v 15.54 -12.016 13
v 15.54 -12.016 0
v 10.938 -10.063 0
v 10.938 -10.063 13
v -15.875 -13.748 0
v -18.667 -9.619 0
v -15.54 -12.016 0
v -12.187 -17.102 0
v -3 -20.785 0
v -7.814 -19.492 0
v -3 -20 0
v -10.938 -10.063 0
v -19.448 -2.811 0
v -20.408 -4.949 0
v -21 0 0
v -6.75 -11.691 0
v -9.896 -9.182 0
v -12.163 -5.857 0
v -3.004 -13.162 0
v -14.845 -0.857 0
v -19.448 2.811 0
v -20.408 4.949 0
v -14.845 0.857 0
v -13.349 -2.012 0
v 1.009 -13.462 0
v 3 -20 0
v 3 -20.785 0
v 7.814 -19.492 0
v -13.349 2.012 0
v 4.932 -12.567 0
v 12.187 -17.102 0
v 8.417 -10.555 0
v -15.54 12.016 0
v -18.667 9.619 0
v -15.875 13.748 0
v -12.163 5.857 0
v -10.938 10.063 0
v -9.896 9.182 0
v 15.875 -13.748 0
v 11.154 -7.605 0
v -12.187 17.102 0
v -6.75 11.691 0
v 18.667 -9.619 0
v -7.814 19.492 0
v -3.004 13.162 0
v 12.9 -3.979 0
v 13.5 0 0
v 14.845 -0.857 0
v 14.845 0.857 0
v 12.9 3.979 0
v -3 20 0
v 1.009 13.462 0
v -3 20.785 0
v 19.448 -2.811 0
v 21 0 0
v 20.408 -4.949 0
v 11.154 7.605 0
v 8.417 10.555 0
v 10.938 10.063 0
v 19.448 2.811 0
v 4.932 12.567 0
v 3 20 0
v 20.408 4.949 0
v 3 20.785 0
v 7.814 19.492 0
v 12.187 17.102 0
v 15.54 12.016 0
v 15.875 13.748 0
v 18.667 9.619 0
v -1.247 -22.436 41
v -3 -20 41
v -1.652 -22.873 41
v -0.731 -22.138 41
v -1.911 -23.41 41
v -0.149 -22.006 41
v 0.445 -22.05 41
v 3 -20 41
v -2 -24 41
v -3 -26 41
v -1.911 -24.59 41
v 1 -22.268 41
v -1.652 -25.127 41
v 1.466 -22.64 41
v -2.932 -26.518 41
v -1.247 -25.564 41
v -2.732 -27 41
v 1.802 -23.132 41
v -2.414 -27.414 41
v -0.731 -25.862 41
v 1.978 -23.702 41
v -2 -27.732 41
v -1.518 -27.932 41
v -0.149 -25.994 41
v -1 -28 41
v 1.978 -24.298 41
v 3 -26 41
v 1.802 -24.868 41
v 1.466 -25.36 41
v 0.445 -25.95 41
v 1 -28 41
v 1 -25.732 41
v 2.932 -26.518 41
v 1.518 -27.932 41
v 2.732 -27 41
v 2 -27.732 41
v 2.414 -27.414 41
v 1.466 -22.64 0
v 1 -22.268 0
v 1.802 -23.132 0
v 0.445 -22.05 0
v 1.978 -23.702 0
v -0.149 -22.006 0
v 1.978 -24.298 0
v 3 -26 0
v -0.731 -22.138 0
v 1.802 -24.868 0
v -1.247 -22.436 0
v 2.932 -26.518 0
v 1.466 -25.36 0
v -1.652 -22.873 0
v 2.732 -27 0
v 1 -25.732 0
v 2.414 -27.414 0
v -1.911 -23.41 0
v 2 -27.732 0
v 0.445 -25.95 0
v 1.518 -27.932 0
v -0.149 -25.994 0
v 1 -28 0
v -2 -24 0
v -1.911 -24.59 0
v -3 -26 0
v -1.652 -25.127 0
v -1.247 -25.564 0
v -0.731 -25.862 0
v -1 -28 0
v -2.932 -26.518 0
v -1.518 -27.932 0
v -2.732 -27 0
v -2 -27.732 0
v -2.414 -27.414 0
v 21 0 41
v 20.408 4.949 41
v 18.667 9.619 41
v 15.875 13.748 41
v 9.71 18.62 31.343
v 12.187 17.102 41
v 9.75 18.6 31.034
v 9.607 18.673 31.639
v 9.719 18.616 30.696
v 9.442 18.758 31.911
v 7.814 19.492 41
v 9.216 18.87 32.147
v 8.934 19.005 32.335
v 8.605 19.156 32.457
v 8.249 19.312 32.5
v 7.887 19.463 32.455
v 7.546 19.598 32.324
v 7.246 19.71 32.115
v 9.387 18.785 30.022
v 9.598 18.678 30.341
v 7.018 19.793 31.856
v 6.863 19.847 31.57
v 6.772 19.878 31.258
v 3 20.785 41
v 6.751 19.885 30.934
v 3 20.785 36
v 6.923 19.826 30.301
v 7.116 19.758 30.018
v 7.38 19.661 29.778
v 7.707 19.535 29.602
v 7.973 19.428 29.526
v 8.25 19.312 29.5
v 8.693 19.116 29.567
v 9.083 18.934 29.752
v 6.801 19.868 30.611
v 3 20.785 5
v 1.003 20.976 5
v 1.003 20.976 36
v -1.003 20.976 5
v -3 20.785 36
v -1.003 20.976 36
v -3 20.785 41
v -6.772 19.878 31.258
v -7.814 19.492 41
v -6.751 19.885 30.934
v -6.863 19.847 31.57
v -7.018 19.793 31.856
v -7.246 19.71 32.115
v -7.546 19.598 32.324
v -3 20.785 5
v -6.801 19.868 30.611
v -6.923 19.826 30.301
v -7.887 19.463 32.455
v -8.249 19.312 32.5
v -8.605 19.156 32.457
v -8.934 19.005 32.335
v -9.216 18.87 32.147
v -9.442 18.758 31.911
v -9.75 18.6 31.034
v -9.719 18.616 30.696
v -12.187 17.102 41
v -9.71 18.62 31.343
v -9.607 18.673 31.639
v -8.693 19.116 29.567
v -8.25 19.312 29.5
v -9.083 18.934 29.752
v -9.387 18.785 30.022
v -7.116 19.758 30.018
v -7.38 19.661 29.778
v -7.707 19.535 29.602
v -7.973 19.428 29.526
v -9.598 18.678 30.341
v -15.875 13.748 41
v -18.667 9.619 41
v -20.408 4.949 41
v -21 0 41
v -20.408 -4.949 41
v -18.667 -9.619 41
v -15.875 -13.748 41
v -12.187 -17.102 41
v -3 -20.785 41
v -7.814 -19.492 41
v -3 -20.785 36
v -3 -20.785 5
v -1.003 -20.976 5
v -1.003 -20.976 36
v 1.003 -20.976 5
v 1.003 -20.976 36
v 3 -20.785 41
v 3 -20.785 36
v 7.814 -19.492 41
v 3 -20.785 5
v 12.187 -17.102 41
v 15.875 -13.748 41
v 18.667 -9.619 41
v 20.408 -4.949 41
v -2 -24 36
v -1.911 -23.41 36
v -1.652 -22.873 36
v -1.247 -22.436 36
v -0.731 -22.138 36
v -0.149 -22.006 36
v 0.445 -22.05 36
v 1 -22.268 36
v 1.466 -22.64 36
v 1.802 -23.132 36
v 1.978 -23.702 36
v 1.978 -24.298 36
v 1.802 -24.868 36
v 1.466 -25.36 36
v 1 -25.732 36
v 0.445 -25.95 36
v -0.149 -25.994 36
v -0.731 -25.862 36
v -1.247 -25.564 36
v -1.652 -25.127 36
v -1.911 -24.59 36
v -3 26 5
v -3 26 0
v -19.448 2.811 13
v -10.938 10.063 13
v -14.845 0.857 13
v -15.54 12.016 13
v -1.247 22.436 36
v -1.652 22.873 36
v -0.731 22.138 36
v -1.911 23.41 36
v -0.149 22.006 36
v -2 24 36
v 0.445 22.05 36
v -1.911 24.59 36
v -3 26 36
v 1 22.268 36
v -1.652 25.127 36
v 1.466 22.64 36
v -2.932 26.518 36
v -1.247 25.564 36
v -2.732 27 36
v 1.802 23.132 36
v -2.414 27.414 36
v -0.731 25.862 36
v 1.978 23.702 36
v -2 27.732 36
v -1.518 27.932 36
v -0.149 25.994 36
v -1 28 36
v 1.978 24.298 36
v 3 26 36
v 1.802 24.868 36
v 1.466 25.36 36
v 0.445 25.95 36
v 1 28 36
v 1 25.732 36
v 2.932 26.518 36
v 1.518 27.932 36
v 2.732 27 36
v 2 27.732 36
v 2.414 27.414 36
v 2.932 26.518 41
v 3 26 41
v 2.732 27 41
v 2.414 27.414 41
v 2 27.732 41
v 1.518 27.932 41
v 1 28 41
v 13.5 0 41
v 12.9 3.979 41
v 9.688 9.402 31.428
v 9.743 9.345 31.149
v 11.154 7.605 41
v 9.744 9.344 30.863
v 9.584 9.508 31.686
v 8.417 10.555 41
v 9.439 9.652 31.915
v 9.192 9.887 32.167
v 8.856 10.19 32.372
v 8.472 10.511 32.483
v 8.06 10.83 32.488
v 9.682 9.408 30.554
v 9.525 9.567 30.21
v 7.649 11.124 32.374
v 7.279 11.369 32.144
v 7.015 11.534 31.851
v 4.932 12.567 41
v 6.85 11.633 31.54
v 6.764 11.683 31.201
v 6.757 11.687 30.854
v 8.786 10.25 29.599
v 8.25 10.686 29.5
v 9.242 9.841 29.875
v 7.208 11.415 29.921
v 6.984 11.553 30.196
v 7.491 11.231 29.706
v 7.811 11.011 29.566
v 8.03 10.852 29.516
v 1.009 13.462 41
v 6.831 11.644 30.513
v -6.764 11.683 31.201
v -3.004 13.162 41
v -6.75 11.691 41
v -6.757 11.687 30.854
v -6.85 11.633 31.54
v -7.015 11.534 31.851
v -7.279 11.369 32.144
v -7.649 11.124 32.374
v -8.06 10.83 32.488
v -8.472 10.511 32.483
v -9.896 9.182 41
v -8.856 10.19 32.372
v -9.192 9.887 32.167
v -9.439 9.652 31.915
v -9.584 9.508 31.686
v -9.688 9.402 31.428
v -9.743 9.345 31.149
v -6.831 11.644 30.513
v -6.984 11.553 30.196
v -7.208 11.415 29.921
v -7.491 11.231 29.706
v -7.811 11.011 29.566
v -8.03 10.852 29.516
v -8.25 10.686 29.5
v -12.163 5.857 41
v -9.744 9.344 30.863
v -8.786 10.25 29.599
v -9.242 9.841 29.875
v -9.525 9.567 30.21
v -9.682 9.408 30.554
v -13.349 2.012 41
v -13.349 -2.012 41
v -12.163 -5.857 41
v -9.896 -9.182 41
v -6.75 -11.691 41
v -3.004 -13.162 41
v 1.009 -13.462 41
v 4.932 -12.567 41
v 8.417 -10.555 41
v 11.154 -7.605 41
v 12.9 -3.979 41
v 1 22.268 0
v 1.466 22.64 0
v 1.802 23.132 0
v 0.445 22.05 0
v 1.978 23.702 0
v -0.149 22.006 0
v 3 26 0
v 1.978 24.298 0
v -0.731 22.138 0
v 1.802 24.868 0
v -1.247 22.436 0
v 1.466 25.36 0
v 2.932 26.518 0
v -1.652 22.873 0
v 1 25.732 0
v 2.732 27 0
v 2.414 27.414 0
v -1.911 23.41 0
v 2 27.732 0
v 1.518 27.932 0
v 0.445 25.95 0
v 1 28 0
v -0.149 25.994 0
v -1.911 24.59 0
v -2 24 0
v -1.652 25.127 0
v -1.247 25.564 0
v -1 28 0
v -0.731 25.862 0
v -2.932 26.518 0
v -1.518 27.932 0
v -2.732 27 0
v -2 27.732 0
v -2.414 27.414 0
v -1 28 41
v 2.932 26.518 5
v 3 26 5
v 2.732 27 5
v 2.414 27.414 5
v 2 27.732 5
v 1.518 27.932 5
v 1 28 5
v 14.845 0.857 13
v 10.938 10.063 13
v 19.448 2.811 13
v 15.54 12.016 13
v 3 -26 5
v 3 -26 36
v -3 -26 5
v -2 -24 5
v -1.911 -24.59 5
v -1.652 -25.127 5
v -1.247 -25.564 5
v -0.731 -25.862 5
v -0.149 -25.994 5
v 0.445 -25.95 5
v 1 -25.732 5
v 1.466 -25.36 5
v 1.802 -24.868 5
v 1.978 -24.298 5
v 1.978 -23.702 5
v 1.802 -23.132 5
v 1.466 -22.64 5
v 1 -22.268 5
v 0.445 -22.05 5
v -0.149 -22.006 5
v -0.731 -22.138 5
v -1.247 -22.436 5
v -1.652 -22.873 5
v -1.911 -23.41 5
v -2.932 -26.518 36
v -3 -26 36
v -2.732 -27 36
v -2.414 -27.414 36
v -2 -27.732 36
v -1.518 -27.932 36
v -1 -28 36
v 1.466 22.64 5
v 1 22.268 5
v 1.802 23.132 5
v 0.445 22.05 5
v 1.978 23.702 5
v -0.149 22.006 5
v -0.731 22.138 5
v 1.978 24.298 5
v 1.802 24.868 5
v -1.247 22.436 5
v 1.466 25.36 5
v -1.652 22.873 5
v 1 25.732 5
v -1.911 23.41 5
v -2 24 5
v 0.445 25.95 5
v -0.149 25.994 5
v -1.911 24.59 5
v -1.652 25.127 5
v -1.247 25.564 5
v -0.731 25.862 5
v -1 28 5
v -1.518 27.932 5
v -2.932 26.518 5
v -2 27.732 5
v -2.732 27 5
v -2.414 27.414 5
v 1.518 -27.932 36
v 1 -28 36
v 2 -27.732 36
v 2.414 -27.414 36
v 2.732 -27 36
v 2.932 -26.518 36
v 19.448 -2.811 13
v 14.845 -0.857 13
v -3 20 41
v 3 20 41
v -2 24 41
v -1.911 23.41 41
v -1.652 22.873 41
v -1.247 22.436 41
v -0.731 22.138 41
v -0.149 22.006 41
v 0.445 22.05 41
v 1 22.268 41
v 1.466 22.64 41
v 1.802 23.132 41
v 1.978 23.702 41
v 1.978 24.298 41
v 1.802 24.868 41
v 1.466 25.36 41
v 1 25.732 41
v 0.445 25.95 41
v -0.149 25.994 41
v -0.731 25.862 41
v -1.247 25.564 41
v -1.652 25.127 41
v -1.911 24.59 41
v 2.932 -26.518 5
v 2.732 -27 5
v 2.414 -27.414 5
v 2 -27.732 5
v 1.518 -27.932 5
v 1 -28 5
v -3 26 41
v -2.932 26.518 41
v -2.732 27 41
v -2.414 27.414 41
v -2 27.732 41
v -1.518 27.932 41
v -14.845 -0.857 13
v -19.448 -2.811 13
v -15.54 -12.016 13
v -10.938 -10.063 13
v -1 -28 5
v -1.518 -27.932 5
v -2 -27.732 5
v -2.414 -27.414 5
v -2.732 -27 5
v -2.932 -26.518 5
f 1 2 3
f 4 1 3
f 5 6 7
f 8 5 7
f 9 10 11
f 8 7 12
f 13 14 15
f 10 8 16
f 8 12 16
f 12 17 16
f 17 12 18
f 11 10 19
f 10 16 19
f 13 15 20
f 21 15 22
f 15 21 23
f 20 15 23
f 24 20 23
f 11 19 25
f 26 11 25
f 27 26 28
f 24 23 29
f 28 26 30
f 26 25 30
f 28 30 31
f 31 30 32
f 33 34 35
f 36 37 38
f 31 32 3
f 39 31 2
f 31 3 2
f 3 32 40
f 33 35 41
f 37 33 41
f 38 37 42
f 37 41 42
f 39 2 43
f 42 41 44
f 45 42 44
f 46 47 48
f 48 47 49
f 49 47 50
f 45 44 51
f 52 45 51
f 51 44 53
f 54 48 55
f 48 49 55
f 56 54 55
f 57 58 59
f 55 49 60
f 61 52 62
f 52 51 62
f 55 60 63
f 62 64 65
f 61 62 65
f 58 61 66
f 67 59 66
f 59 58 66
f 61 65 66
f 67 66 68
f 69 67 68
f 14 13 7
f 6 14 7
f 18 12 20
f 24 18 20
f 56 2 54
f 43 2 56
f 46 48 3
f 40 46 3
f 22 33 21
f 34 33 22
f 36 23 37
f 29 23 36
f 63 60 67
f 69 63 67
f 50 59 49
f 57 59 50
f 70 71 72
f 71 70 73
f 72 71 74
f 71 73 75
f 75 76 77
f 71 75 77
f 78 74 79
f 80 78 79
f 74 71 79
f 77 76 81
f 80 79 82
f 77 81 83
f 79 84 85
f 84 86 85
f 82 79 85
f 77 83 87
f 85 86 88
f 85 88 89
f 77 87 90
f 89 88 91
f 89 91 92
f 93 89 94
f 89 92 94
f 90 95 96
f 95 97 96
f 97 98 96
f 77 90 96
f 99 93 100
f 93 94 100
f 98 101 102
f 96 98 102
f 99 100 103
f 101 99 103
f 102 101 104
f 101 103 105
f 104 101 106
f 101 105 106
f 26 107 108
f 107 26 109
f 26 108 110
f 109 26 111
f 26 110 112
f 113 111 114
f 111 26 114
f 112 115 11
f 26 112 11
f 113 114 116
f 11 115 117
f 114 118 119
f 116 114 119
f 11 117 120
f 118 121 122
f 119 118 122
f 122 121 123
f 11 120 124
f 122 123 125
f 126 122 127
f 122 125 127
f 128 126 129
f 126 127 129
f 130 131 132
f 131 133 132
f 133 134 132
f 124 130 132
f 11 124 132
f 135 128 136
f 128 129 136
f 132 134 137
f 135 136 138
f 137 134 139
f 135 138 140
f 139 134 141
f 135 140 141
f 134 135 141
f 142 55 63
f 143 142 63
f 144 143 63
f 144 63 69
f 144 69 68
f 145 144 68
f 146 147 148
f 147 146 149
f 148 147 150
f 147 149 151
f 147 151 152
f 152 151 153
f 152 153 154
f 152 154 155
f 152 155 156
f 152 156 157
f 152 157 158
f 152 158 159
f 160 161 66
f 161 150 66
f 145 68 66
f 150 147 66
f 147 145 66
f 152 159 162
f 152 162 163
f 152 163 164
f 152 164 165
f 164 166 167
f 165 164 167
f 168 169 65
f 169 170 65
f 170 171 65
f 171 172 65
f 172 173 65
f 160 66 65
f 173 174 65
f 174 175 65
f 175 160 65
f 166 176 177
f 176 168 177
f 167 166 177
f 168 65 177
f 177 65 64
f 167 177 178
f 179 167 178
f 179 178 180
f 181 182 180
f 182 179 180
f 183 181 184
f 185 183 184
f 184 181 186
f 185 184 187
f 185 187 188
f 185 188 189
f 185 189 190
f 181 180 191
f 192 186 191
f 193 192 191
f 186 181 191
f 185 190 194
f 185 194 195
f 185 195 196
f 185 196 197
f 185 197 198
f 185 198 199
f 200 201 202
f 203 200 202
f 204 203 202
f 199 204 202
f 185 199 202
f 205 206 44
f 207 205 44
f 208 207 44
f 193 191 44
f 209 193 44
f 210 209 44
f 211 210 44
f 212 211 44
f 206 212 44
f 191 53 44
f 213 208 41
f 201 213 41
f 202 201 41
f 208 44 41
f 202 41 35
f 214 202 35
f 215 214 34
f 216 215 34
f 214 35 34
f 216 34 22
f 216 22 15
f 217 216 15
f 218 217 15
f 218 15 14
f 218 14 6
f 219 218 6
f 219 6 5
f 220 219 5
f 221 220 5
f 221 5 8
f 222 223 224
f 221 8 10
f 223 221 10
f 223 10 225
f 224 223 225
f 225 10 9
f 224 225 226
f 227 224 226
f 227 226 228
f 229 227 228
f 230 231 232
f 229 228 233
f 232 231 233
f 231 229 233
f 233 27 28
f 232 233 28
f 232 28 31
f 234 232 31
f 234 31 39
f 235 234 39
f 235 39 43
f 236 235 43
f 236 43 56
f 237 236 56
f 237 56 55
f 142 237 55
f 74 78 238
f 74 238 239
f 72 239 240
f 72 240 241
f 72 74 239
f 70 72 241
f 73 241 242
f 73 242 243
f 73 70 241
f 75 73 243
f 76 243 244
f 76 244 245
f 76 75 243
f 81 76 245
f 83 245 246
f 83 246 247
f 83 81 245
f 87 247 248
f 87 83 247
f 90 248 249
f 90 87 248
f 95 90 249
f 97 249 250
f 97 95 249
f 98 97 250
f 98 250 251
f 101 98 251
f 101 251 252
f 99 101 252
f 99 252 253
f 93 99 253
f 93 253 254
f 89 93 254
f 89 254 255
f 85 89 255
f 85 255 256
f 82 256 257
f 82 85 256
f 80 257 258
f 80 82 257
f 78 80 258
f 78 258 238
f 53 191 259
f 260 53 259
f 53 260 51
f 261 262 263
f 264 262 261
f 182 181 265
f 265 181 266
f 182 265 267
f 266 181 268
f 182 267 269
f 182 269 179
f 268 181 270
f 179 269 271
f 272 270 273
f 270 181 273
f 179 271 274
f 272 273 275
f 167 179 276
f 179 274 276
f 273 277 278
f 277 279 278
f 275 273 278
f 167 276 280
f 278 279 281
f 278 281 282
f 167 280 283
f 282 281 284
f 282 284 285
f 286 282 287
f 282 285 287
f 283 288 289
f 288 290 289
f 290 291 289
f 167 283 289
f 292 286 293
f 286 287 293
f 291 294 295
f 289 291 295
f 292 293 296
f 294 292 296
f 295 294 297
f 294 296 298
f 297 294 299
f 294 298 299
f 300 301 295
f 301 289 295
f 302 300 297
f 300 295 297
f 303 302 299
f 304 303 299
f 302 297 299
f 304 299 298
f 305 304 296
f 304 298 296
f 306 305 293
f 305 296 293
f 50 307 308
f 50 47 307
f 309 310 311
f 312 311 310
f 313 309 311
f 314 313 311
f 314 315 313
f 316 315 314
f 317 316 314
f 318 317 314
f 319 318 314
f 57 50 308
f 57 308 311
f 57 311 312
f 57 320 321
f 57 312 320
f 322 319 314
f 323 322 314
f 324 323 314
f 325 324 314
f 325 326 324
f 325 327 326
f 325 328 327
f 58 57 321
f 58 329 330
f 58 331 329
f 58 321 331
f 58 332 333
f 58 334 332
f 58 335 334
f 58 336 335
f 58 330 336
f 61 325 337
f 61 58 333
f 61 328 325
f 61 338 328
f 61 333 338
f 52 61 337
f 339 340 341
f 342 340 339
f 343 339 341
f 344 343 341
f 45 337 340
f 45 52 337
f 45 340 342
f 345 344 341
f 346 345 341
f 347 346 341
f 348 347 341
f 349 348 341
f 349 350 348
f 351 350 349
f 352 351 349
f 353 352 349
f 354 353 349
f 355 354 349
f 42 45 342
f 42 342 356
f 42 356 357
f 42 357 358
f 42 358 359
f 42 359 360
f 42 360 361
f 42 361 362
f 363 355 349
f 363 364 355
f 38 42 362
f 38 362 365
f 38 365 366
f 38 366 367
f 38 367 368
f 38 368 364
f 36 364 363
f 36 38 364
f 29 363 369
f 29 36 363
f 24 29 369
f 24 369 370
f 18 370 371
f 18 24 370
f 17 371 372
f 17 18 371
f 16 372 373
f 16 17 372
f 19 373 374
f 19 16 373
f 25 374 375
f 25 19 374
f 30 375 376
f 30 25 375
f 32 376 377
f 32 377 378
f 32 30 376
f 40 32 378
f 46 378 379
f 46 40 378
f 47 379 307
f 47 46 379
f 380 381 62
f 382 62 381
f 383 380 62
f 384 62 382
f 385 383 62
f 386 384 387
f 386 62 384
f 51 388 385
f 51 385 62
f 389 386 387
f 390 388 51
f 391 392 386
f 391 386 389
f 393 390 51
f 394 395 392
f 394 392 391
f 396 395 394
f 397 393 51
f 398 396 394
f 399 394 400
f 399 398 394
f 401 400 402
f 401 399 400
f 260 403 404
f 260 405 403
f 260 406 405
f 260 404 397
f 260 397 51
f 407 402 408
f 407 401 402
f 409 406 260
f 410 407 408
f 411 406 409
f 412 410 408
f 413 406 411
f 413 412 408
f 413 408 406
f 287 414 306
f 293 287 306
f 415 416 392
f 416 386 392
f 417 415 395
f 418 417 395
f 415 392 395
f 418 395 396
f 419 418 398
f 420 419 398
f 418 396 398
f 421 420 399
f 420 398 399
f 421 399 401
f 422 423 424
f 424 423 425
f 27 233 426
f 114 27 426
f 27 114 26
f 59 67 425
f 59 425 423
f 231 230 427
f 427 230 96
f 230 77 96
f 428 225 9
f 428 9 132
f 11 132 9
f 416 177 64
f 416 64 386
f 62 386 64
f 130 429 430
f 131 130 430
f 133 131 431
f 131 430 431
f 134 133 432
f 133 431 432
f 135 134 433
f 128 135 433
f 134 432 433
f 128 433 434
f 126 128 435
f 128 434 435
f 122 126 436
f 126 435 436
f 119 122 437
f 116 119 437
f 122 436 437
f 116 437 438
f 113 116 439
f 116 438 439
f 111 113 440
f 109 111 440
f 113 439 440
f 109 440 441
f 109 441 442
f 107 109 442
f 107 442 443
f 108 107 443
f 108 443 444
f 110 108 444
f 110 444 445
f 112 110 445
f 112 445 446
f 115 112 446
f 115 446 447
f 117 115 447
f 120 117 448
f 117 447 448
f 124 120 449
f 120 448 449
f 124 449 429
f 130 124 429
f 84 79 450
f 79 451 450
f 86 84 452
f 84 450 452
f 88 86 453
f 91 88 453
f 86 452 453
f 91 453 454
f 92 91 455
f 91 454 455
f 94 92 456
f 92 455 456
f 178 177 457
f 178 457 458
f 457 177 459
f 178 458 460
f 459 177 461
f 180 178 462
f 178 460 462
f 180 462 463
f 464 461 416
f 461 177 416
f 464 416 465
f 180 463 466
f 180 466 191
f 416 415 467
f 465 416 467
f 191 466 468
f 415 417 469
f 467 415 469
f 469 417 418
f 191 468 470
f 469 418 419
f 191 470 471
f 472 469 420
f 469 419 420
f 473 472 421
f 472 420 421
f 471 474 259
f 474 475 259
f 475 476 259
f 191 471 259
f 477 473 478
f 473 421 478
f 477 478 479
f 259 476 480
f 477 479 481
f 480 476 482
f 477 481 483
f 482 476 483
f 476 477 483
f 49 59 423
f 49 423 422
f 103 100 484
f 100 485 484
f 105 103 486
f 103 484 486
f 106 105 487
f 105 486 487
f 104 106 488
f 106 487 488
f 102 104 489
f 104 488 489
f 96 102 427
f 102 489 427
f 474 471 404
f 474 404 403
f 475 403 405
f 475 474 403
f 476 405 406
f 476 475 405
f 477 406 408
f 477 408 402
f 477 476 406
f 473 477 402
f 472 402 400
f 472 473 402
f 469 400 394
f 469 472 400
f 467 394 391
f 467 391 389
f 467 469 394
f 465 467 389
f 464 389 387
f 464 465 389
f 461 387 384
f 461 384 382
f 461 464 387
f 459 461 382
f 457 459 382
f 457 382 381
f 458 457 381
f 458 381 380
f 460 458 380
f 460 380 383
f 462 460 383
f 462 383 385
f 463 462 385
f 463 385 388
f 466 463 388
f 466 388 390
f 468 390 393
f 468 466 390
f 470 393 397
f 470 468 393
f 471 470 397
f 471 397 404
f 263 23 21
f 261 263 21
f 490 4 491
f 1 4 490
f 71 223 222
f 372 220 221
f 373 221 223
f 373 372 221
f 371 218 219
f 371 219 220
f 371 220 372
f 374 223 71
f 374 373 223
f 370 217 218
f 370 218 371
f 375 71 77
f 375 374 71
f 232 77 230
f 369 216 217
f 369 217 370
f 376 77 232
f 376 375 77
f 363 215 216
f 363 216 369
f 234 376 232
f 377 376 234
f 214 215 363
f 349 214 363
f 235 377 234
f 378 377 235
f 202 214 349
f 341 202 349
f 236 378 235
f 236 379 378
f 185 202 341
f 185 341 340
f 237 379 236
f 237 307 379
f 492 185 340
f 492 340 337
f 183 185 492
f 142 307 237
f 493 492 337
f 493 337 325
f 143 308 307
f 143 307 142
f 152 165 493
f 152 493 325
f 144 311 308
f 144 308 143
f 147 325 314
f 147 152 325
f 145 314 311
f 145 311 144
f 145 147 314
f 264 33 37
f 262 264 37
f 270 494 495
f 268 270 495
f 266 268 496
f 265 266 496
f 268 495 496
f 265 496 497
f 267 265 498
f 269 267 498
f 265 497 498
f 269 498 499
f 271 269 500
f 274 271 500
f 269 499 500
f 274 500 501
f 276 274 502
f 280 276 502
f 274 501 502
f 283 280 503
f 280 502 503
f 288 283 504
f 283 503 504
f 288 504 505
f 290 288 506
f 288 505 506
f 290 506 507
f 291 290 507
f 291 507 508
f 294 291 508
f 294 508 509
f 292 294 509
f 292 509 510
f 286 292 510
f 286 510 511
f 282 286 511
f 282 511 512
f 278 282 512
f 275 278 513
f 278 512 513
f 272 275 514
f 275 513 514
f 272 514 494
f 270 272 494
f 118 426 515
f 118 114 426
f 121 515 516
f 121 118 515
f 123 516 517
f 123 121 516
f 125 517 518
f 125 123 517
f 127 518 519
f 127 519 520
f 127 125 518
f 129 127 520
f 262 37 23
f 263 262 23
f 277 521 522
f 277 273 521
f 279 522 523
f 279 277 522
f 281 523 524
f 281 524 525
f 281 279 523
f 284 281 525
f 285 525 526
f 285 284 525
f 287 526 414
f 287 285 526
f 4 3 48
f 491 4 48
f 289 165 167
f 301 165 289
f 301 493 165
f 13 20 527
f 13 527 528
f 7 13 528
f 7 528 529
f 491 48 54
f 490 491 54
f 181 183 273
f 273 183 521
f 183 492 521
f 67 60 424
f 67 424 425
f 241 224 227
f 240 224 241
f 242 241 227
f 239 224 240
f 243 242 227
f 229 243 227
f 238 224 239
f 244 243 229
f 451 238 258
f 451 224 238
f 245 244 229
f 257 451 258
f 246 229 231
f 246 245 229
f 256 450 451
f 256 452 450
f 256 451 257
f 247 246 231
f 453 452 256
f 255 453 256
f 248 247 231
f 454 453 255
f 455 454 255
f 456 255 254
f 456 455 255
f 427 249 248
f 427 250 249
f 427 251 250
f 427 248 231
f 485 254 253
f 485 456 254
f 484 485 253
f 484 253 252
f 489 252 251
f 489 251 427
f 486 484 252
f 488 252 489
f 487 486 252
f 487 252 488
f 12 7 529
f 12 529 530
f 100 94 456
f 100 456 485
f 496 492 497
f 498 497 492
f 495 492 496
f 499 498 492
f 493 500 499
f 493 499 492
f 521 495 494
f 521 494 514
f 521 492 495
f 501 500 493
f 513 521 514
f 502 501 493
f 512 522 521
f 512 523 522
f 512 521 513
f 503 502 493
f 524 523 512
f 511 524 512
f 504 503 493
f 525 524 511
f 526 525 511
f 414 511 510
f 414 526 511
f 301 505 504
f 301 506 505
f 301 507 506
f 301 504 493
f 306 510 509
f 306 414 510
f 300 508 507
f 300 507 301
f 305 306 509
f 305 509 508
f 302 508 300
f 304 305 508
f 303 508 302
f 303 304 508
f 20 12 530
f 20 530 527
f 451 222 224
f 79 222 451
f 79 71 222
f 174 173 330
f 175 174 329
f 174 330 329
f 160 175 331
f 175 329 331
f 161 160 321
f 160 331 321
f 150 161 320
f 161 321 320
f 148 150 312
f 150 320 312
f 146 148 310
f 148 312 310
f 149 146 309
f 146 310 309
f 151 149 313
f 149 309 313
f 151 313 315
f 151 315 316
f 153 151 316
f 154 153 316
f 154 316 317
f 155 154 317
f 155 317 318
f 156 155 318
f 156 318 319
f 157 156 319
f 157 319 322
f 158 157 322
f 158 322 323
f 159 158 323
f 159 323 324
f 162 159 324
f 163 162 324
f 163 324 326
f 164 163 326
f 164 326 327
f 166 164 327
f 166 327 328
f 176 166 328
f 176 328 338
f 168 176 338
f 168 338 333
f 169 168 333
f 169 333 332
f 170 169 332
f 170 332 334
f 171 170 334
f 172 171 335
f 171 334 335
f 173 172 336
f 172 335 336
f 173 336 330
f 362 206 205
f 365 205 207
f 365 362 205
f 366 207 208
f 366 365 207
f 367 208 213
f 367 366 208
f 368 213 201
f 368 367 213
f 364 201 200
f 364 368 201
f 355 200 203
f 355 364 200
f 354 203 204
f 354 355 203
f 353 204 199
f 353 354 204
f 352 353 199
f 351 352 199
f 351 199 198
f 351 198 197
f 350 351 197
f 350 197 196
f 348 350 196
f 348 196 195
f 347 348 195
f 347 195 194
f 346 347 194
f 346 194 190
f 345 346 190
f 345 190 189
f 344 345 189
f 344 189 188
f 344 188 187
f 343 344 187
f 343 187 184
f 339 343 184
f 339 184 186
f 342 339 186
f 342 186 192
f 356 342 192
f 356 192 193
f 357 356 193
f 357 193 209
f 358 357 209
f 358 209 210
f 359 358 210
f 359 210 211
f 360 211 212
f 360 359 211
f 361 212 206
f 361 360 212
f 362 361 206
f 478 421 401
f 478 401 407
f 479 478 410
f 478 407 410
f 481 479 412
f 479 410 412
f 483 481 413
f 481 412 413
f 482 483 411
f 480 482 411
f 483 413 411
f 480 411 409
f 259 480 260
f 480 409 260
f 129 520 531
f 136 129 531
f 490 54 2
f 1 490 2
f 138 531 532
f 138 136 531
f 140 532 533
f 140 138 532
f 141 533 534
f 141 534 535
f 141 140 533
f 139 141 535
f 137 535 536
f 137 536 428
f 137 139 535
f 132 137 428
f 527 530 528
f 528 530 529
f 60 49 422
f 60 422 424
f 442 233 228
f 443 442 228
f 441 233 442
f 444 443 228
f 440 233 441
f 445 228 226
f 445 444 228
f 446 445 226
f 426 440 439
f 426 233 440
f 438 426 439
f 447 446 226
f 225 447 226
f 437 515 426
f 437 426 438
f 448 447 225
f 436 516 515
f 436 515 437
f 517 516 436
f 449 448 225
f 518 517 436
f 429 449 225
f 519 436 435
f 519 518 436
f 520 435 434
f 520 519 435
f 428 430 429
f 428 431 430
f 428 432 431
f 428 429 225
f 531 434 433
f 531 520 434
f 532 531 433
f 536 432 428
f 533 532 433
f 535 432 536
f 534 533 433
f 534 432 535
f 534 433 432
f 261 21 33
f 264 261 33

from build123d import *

# Parameters (mm, degrees)
SKETCH1_R                = 19.01
SKETCH1_R_2              = 13.5
BOSS_EXTRUDE1_DEPTH      = 18
BOSS_EXTRUDE2_DEPTH      = 23
BOSS_EXTRUDE2_DEPTH_BACK = 18
SKETCH2_R                = 21
SKETCH2_R_2              = 13.5
CUT_EXTRUDE1_DEPTH       = 13
MIRROR2_COPY_1_DEPTH     = 13
BOSS_EXTRUDE3_START      = -5
SKETCH4_W                = 6
SKETCH4_H                = 8
SKETCH4_R                = 2
BOSS_EXTRUDE3_DEPTH      = 5.0001
FILLET1_R                = 2
FILLET1_OF_MIRROR5_R     = 2
BOSS_EXTRUDE6_START      = 0.0001
SKETCH7_W                = 6
SKETCH7_H                = 8
SKETCH7_R                = 2
BOSS_EXTRUDE6_DEPTH      = 5.0001
FILLET2_R                = 2
CUT_EXTRUDE2_START       = -0.0001
SKETCH9_R                = 1.5
CUT_EXTRUDE2_DEPTH       = 20.0001


with BuildPart() as part:
    # Sketch1 → Boss-Extrude1 (new body)
    with BuildSketch(Plane.XY):
        Circle(SKETCH1_R)
        Circle(SKETCH1_R_2, mode=Mode.SUBTRACT)
    extrude(amount=BOSS_EXTRUDE1_DEPTH)

    # Sketch2 → Boss-Extrude2 (add, two sides: drawn at the far end of the back side and taken through both)
    with BuildSketch(Plane.XY.offset(18).offset(-BOSS_EXTRUDE2_DEPTH_BACK)):
        Circle(SKETCH2_R)
        Circle(SKETCH2_R_2, mode=Mode.SUBTRACT)
    extrude(amount=BOSS_EXTRUDE2_DEPTH + BOSS_EXTRUDE2_DEPTH_BACK)

    # Sketch3 → Cut-Extrude1 (cut)
    with BuildSketch(Plane(origin=(0, 0, 0), x_dir=(-1, 0, 0), z_dir=(0, 0, -1))):
        Polygon((15.540276616, 12.01617991), (10.937752349, 10.062524267), (14.845063634, 0.857475733), (19.447587901, 2.811131375), align=None)
    cut_extrude1 = extrude(amount=-CUT_EXTRUDE1_DEPTH, mode=Mode.SUBTRACT)

    # Mirror1: Cut-Extrude1 across plane
    add(cut_extrude1.mirror(Plane.ZX), mode=Mode.SUBTRACT)

    # Mirror2: Cut-Extrude1 across plane
    add(cut_extrude1.mirror(Plane(origin=(0, 0, 0), x_dir=(0, 0, 1), z_dir=(1, 0, 0))), mode=Mode.SUBTRACT)

    # Mirror2 copy 1 sketch → Mirror2 copy 1 (cut)
    with BuildSketch(Plane(origin=(0, 0, 0), x_dir=(1, 0, 0), z_dir=(0, 0, -1))):
        Polygon((15.540276616, 12.01617991), (10.937752349, 10.062524267), (14.845063634, 0.857475733), (19.447587901, 2.811131375), align=None)
    extrude(amount=-MIRROR2_COPY_1_DEPTH, mode=Mode.SUBTRACT)

    # Sketch4 → Boss-Extrude3 (add)
    with BuildSketch(Plane(origin=(0, 0, 0), x_dir=(-1, 0, 0), z_dir=(0, 0, -1)).offset(BOSS_EXTRUDE3_START)):
        with Locations((0, 24)):
            Rectangle(SKETCH4_W, SKETCH4_H)
        with Locations((0, 24)):
            Circle(SKETCH4_R, mode=Mode.SUBTRACT)
    boss_extrude3 = extrude(amount=BOSS_EXTRUDE3_DEPTH)

    # Fillet1
    fillet1_edges = [part.edges().sort_by_distance(p)[0] for p in [
        (-3, 28, 2.49995),
        (3, 28, 2.49995),
    ]]
    fillet(fillet1_edges, radius=FILLET1_R)

    # Mirror5: Boss-Extrude3 across plane
    add(boss_extrude3.mirror(Plane.ZX))

    # Fillet1 of Mirror5
    fillet1_of_mirror5_edges = [part.edges().sort_by_distance(p)[0] for p in [
        (-3, -28, 2.49995),
        (3, -28, 2.49995),
    ]]
    fillet(fillet1_of_mirror5_edges, radius=FILLET1_OF_MIRROR5_R)

    # Sketch7 → Boss-Extrude6 (add)
    with BuildSketch(Plane.XY.offset(41).offset(BOSS_EXTRUDE6_START)):
        with Locations((0, 24)):
            Rectangle(SKETCH7_W, SKETCH7_H)
        with Locations(Location((0, 24, 0), (0, 0, 180))):
            Circle(SKETCH7_R, mode=Mode.SUBTRACT)
    boss_extrude6 = extrude(amount=-BOSS_EXTRUDE6_DEPTH)

    # Mirror6: Boss-Extrude6 across plane
    add(boss_extrude6.mirror(Plane.ZX))

    # Fillet2
    fillet2_edges = [part.edges().sort_by_distance(p)[0] for p in [
        (-3, 28, 38.50005),
        (3, 28, 38.50005),
        (-3, -28, 38.50005),
        (3, -28, 38.50005),
    ]]
    fillet(fillet2_edges, radius=FILLET2_R)

    # Sketch9 → Cut-Extrude2 (cut)
    with BuildSketch(Plane(origin=(0, 0, 0), x_dir=(1, 0, 0), z_dir=(0, 1, 0)).offset(CUT_EXTRUDE2_START)):
        with Locations(Location((-8.25, -31, 0), (0, 0, 90))):
            Circle(SKETCH9_R)
    cut_extrude2 = extrude(amount=CUT_EXTRUDE2_DEPTH, mode=Mode.SUBTRACT)

    # Mirror7: Cut-Extrude2 across plane
    add(cut_extrude2.mirror(Plane(origin=(0, 0, 0), x_dir=(0, 0, 1), z_dir=(1, 0, 0))), mode=Mode.SUBTRACT)


solid = part.part
